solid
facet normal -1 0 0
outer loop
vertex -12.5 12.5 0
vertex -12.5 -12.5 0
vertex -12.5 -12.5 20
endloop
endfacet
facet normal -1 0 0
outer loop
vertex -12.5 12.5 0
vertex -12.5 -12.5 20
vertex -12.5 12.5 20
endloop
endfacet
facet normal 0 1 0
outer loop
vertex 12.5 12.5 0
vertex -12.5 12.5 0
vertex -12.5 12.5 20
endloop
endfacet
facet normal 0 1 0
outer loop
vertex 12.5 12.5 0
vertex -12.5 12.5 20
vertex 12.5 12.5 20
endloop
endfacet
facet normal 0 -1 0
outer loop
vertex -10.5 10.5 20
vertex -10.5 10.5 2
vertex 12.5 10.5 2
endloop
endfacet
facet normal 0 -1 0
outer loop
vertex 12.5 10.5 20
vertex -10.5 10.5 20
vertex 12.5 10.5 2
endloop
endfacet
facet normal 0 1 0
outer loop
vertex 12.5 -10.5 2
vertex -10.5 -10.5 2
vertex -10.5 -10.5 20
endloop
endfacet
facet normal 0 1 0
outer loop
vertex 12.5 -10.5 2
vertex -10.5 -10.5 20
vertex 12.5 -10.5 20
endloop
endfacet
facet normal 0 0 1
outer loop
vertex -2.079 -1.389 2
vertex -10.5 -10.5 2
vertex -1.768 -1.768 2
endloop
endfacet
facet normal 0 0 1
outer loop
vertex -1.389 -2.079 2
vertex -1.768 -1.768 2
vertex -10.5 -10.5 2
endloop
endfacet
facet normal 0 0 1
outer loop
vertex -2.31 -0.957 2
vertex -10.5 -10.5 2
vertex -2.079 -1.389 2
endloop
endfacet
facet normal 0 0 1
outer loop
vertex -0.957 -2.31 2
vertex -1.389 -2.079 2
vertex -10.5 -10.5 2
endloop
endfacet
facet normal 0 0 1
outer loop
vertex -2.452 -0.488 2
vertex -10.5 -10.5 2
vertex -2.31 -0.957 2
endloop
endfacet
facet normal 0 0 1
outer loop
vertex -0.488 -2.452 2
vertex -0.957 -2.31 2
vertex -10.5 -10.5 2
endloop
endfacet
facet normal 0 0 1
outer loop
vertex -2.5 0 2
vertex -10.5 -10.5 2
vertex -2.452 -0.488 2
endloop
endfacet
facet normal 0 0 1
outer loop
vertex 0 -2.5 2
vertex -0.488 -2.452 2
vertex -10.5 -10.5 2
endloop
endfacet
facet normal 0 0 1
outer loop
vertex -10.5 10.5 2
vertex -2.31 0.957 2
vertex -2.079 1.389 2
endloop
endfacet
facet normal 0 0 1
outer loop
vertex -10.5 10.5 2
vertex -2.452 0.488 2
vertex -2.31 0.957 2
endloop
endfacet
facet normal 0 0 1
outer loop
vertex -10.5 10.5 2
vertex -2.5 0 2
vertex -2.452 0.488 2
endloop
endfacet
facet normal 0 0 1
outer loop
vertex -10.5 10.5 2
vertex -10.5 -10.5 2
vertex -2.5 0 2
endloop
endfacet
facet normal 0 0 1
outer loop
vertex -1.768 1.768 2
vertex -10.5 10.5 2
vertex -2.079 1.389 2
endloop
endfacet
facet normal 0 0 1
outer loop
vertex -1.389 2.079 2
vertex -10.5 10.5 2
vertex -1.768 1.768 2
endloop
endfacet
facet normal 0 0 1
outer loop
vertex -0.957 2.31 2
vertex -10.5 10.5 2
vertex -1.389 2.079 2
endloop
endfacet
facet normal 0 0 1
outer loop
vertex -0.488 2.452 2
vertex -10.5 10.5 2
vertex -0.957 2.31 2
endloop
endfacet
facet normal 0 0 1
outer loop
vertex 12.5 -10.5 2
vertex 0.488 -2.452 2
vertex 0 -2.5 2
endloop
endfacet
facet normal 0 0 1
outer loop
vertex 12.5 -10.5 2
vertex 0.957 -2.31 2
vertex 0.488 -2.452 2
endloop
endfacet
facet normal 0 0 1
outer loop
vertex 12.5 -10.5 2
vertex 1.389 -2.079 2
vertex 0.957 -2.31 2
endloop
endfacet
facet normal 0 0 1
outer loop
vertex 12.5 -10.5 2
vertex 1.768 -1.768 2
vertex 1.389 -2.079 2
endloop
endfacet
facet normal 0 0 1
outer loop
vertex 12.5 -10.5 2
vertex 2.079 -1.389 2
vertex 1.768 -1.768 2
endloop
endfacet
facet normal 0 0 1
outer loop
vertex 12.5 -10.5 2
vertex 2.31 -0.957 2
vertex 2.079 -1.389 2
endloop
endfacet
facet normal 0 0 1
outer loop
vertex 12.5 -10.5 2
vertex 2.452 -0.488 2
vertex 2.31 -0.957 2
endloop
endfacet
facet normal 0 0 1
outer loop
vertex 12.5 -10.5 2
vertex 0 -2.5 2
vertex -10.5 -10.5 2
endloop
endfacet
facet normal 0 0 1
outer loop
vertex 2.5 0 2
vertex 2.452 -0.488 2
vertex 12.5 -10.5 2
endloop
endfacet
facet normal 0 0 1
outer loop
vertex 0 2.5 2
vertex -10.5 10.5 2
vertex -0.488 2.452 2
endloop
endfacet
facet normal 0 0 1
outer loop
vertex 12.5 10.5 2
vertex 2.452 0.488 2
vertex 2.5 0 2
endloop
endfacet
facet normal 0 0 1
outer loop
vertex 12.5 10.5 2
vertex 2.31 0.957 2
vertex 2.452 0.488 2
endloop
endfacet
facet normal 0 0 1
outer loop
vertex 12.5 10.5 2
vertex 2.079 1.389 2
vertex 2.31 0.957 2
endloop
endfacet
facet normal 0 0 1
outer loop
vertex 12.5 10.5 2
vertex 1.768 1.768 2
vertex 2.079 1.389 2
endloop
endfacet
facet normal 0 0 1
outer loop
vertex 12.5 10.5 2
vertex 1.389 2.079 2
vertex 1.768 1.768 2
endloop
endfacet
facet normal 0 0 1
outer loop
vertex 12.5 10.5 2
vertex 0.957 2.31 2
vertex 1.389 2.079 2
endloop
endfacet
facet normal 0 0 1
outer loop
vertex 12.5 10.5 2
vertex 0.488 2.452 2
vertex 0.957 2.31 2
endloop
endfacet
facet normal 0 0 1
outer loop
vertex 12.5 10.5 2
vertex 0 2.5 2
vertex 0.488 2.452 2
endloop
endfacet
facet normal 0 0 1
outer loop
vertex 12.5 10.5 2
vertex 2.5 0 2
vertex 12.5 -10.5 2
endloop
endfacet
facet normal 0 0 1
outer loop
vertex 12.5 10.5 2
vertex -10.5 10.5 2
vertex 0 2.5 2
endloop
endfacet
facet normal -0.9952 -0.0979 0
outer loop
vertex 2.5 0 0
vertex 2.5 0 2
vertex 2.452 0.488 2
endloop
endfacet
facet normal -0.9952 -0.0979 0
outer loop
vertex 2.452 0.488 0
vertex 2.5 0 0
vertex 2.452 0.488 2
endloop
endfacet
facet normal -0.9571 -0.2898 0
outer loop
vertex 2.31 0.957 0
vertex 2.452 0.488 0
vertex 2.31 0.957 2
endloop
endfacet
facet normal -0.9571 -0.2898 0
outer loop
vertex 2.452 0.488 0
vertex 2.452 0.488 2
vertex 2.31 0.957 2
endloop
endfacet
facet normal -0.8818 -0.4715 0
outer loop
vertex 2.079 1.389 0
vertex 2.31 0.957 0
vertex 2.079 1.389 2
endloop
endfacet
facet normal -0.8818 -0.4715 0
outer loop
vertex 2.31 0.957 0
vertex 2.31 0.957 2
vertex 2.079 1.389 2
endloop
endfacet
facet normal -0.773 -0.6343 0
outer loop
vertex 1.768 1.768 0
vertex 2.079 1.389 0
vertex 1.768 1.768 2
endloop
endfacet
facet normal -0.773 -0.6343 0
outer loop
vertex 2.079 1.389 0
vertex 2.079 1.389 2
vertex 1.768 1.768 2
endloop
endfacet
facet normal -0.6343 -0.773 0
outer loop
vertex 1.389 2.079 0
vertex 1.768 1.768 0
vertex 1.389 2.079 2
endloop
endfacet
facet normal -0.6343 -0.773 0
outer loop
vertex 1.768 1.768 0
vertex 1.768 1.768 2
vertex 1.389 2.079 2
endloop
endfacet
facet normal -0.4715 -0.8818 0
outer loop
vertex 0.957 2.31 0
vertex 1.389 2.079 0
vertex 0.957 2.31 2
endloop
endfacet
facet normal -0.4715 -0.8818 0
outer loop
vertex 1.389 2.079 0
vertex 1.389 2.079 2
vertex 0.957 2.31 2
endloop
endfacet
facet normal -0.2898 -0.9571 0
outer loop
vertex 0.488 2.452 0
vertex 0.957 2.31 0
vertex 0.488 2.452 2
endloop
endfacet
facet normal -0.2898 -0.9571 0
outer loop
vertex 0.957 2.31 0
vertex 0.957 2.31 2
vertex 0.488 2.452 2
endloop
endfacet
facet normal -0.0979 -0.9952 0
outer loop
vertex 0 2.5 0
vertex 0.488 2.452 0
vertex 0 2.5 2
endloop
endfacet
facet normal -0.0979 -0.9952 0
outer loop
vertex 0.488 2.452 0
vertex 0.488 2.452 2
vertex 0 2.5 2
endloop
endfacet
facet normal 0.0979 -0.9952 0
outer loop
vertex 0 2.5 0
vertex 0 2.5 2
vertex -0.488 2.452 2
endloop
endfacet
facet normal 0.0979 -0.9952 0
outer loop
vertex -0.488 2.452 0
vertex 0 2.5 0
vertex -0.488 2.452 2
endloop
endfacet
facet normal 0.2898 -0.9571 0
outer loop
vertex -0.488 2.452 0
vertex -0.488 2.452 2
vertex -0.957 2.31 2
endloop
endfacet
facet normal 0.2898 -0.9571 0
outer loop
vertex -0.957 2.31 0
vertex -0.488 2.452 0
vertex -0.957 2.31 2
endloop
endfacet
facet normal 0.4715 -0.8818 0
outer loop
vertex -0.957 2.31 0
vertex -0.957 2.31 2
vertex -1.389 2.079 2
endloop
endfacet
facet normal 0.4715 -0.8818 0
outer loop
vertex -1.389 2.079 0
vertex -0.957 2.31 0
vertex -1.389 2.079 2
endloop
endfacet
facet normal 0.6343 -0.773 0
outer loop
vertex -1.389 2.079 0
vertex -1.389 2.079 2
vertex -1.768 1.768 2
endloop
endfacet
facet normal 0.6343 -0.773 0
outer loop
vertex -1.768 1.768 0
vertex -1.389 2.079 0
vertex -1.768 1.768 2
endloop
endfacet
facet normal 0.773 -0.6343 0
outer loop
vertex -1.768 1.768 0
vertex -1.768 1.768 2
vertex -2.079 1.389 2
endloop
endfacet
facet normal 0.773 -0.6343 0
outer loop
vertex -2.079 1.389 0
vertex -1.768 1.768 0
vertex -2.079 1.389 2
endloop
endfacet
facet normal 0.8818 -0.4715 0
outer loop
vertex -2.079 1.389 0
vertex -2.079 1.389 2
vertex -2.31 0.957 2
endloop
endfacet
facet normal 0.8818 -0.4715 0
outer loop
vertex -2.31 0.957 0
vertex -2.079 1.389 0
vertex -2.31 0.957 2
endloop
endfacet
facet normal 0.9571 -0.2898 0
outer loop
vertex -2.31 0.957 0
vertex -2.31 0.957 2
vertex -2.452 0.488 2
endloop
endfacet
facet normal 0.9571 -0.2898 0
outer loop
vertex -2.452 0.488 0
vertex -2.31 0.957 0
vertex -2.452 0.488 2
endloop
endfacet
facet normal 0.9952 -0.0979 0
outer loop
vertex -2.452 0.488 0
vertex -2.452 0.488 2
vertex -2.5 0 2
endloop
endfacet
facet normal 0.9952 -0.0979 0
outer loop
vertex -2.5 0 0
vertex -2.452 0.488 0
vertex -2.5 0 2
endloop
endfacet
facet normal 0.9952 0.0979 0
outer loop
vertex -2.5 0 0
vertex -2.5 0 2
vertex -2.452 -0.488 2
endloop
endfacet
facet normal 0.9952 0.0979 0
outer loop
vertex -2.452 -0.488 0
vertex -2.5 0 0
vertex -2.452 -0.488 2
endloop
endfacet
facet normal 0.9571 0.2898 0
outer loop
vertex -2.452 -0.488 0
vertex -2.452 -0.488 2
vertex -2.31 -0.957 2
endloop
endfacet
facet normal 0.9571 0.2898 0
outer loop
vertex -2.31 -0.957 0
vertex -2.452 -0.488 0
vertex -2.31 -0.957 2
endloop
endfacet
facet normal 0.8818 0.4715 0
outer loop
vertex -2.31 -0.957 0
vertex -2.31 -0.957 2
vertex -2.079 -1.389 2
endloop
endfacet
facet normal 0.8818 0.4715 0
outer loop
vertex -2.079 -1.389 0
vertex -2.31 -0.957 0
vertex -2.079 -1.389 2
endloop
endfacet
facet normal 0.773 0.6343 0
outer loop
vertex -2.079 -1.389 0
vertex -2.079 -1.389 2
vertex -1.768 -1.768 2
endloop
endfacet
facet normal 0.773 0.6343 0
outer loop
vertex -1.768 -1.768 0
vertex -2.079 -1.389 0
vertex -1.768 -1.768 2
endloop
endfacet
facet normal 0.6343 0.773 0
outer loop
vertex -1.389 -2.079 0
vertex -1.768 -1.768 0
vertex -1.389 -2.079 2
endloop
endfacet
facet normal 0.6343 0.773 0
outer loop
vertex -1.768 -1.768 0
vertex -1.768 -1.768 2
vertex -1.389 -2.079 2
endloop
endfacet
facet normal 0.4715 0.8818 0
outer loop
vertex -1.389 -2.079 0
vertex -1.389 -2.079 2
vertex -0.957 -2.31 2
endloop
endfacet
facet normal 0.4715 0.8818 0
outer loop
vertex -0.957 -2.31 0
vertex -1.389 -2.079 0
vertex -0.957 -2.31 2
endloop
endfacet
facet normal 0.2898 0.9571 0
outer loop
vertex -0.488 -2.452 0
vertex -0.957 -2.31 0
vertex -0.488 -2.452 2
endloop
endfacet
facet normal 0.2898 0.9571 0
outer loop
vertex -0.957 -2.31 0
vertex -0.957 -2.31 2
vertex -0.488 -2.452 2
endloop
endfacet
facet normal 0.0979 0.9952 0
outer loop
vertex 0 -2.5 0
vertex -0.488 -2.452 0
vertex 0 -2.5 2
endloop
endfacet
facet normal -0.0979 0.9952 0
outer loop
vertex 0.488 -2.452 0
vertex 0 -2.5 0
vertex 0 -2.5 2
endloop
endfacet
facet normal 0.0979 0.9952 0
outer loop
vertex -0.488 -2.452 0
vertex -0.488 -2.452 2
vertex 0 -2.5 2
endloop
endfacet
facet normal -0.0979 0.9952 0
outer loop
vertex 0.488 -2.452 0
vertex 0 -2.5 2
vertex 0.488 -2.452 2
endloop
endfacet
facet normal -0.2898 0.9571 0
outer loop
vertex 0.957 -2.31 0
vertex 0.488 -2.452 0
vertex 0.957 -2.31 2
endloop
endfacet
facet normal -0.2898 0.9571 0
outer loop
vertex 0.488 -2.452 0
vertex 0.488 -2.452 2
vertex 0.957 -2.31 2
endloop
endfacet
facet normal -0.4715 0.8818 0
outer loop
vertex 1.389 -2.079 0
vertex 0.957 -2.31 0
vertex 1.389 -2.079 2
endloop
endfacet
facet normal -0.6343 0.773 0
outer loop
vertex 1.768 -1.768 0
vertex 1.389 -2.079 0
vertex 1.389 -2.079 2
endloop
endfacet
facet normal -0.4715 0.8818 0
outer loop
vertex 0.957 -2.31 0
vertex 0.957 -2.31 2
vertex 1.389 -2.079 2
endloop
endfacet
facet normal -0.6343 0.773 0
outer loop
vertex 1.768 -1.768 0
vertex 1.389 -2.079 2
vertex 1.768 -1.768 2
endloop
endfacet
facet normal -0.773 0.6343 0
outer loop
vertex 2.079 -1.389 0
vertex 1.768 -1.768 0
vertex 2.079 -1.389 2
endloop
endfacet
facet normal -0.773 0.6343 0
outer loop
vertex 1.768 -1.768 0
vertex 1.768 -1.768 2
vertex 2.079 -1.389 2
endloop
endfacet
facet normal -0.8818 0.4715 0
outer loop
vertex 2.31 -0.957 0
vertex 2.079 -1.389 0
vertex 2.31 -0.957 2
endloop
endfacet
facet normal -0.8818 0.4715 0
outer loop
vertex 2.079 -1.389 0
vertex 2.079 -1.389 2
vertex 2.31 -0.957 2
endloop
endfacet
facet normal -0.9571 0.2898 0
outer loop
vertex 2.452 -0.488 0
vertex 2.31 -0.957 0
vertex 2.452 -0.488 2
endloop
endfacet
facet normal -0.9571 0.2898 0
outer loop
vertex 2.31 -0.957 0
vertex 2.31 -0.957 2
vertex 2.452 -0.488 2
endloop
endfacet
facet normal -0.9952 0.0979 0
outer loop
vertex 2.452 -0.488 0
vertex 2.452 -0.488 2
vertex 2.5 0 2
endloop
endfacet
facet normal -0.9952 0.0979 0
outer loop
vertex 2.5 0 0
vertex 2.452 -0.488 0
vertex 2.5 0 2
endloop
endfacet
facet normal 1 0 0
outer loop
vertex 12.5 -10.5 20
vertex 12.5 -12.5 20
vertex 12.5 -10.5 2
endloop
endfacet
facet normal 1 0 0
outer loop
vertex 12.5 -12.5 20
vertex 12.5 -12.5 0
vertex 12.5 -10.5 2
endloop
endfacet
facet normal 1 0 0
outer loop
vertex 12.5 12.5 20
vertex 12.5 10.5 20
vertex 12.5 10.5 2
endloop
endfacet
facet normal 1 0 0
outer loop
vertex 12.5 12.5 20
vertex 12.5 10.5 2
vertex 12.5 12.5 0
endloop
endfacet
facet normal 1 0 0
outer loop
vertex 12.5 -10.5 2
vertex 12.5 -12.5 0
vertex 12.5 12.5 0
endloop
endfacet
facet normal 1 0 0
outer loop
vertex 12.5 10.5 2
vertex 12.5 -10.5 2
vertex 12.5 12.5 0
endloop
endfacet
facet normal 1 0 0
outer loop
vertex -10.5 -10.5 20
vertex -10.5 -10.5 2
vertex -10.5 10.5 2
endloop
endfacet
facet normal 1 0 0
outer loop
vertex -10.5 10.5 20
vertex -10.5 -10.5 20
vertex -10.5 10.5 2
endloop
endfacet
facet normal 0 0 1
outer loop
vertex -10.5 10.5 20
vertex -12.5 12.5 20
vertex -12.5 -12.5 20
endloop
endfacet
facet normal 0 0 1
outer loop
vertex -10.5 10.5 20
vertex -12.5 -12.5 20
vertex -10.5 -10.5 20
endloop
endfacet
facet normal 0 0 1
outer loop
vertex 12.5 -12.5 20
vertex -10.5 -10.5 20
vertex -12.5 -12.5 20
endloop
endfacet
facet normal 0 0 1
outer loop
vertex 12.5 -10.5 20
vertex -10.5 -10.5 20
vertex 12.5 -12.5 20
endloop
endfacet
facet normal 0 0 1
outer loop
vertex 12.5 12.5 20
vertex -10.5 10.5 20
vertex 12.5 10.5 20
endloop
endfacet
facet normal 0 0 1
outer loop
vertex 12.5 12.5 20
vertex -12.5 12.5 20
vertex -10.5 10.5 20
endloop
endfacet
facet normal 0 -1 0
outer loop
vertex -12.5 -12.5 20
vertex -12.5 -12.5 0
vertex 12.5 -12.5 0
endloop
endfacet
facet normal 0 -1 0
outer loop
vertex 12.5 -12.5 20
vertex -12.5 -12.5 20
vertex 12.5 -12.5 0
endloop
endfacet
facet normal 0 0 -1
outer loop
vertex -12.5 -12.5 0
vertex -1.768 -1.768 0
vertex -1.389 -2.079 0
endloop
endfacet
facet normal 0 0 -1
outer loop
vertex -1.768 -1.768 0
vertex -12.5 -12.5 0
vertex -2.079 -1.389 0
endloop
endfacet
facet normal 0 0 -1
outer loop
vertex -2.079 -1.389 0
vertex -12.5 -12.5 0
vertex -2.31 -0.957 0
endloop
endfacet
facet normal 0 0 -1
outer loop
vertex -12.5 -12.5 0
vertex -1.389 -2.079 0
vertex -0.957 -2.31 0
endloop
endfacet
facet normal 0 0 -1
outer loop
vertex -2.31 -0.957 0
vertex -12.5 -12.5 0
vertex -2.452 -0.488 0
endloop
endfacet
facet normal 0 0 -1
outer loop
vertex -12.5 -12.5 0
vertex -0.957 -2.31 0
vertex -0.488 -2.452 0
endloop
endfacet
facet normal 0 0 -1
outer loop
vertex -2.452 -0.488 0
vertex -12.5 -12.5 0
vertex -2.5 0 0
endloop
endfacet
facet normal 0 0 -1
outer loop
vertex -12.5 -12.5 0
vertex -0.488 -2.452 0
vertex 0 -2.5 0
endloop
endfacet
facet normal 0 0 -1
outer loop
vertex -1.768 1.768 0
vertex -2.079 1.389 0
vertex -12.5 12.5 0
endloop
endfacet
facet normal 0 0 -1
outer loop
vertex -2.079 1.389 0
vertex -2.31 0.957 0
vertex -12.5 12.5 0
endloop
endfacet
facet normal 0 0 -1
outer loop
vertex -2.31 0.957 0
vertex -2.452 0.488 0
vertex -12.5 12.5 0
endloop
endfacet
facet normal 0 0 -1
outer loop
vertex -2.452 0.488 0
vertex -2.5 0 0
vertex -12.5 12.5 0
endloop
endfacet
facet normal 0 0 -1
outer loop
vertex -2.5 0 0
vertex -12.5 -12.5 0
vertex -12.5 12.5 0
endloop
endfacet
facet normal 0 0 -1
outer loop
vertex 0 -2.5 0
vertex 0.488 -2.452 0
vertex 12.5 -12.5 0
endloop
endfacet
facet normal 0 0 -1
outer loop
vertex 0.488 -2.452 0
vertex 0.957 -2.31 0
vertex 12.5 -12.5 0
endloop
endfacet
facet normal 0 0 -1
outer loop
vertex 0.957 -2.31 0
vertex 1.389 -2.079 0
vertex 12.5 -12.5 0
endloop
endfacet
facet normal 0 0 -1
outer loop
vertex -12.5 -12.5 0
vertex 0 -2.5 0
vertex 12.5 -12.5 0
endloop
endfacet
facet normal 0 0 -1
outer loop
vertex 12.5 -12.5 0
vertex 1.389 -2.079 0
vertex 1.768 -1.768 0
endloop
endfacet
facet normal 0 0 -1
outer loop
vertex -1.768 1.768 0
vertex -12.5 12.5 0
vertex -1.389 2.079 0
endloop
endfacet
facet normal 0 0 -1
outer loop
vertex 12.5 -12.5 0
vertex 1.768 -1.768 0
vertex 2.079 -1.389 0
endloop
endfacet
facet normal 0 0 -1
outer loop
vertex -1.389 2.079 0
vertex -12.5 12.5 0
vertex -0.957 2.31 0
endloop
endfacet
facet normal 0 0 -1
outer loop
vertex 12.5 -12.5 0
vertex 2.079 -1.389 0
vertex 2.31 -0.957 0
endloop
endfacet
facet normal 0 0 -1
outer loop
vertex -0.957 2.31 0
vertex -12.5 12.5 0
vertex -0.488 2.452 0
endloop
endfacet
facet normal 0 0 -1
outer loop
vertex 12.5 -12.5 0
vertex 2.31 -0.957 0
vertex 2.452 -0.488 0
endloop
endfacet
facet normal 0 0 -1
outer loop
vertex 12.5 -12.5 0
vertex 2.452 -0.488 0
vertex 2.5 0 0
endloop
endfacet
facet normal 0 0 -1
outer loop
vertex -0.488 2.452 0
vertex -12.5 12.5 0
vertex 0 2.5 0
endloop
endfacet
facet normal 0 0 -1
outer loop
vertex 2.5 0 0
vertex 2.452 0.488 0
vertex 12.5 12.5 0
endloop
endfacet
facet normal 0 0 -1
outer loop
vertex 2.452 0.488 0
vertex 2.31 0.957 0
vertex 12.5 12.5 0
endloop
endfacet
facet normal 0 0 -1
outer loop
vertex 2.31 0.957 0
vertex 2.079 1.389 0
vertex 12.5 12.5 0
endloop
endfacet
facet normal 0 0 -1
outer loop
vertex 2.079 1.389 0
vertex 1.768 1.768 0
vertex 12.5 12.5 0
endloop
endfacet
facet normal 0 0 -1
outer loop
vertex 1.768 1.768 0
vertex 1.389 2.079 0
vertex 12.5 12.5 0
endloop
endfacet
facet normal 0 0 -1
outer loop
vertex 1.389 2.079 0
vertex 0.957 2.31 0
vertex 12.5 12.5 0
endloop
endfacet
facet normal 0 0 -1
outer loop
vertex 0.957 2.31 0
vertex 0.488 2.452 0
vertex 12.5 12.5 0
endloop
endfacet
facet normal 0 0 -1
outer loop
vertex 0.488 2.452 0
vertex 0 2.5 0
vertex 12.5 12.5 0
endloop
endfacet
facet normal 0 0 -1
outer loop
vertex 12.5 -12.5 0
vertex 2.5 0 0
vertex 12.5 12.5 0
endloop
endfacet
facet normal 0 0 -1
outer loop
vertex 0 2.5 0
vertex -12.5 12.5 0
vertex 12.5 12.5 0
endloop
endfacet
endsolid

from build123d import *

# Parameters (mm, degrees)
IZIM1_W                     = 25
IZIM1_H                     = 25
Y_KSEKLIK_EKSTR_ZYON1_DEPTH = 20
BO_ALTMA1_T                 = -2
IZIM2_R                     = 2.5
KES_EKSTR_ZYON1_DEPTH       = 5


with BuildPart() as part:
    # Çizim1 → Yükseklik-Ekstrüzyon1 (new body)
    with BuildSketch(Plane.XY):
        Rectangle(IZIM1_W, IZIM1_H)
    extrude(amount=Y_KSEKLIK_EKSTR_ZYON1_DEPTH)

    # İç Boşaltma1
    bo_altma1_openings = [part.faces().sort_by_distance(p)[0] for p in [
        (0, 0, 20),
        (12.5, 0, 10),
    ]]
    offset(amount=BO_ALTMA1_T, openings=bo_altma1_openings, kind=Kind.INTERSECTION)

    # Çizim2 → Kes-Ekstrüzyon1 (cut)
    with BuildSketch(Plane.XY.offset(2)):
        Circle(IZIM2_R)
    extrude(amount=-KES_EKSTR_ZYON1_DEPTH, mode=Mode.SUBTRACT)


solid = part.part
